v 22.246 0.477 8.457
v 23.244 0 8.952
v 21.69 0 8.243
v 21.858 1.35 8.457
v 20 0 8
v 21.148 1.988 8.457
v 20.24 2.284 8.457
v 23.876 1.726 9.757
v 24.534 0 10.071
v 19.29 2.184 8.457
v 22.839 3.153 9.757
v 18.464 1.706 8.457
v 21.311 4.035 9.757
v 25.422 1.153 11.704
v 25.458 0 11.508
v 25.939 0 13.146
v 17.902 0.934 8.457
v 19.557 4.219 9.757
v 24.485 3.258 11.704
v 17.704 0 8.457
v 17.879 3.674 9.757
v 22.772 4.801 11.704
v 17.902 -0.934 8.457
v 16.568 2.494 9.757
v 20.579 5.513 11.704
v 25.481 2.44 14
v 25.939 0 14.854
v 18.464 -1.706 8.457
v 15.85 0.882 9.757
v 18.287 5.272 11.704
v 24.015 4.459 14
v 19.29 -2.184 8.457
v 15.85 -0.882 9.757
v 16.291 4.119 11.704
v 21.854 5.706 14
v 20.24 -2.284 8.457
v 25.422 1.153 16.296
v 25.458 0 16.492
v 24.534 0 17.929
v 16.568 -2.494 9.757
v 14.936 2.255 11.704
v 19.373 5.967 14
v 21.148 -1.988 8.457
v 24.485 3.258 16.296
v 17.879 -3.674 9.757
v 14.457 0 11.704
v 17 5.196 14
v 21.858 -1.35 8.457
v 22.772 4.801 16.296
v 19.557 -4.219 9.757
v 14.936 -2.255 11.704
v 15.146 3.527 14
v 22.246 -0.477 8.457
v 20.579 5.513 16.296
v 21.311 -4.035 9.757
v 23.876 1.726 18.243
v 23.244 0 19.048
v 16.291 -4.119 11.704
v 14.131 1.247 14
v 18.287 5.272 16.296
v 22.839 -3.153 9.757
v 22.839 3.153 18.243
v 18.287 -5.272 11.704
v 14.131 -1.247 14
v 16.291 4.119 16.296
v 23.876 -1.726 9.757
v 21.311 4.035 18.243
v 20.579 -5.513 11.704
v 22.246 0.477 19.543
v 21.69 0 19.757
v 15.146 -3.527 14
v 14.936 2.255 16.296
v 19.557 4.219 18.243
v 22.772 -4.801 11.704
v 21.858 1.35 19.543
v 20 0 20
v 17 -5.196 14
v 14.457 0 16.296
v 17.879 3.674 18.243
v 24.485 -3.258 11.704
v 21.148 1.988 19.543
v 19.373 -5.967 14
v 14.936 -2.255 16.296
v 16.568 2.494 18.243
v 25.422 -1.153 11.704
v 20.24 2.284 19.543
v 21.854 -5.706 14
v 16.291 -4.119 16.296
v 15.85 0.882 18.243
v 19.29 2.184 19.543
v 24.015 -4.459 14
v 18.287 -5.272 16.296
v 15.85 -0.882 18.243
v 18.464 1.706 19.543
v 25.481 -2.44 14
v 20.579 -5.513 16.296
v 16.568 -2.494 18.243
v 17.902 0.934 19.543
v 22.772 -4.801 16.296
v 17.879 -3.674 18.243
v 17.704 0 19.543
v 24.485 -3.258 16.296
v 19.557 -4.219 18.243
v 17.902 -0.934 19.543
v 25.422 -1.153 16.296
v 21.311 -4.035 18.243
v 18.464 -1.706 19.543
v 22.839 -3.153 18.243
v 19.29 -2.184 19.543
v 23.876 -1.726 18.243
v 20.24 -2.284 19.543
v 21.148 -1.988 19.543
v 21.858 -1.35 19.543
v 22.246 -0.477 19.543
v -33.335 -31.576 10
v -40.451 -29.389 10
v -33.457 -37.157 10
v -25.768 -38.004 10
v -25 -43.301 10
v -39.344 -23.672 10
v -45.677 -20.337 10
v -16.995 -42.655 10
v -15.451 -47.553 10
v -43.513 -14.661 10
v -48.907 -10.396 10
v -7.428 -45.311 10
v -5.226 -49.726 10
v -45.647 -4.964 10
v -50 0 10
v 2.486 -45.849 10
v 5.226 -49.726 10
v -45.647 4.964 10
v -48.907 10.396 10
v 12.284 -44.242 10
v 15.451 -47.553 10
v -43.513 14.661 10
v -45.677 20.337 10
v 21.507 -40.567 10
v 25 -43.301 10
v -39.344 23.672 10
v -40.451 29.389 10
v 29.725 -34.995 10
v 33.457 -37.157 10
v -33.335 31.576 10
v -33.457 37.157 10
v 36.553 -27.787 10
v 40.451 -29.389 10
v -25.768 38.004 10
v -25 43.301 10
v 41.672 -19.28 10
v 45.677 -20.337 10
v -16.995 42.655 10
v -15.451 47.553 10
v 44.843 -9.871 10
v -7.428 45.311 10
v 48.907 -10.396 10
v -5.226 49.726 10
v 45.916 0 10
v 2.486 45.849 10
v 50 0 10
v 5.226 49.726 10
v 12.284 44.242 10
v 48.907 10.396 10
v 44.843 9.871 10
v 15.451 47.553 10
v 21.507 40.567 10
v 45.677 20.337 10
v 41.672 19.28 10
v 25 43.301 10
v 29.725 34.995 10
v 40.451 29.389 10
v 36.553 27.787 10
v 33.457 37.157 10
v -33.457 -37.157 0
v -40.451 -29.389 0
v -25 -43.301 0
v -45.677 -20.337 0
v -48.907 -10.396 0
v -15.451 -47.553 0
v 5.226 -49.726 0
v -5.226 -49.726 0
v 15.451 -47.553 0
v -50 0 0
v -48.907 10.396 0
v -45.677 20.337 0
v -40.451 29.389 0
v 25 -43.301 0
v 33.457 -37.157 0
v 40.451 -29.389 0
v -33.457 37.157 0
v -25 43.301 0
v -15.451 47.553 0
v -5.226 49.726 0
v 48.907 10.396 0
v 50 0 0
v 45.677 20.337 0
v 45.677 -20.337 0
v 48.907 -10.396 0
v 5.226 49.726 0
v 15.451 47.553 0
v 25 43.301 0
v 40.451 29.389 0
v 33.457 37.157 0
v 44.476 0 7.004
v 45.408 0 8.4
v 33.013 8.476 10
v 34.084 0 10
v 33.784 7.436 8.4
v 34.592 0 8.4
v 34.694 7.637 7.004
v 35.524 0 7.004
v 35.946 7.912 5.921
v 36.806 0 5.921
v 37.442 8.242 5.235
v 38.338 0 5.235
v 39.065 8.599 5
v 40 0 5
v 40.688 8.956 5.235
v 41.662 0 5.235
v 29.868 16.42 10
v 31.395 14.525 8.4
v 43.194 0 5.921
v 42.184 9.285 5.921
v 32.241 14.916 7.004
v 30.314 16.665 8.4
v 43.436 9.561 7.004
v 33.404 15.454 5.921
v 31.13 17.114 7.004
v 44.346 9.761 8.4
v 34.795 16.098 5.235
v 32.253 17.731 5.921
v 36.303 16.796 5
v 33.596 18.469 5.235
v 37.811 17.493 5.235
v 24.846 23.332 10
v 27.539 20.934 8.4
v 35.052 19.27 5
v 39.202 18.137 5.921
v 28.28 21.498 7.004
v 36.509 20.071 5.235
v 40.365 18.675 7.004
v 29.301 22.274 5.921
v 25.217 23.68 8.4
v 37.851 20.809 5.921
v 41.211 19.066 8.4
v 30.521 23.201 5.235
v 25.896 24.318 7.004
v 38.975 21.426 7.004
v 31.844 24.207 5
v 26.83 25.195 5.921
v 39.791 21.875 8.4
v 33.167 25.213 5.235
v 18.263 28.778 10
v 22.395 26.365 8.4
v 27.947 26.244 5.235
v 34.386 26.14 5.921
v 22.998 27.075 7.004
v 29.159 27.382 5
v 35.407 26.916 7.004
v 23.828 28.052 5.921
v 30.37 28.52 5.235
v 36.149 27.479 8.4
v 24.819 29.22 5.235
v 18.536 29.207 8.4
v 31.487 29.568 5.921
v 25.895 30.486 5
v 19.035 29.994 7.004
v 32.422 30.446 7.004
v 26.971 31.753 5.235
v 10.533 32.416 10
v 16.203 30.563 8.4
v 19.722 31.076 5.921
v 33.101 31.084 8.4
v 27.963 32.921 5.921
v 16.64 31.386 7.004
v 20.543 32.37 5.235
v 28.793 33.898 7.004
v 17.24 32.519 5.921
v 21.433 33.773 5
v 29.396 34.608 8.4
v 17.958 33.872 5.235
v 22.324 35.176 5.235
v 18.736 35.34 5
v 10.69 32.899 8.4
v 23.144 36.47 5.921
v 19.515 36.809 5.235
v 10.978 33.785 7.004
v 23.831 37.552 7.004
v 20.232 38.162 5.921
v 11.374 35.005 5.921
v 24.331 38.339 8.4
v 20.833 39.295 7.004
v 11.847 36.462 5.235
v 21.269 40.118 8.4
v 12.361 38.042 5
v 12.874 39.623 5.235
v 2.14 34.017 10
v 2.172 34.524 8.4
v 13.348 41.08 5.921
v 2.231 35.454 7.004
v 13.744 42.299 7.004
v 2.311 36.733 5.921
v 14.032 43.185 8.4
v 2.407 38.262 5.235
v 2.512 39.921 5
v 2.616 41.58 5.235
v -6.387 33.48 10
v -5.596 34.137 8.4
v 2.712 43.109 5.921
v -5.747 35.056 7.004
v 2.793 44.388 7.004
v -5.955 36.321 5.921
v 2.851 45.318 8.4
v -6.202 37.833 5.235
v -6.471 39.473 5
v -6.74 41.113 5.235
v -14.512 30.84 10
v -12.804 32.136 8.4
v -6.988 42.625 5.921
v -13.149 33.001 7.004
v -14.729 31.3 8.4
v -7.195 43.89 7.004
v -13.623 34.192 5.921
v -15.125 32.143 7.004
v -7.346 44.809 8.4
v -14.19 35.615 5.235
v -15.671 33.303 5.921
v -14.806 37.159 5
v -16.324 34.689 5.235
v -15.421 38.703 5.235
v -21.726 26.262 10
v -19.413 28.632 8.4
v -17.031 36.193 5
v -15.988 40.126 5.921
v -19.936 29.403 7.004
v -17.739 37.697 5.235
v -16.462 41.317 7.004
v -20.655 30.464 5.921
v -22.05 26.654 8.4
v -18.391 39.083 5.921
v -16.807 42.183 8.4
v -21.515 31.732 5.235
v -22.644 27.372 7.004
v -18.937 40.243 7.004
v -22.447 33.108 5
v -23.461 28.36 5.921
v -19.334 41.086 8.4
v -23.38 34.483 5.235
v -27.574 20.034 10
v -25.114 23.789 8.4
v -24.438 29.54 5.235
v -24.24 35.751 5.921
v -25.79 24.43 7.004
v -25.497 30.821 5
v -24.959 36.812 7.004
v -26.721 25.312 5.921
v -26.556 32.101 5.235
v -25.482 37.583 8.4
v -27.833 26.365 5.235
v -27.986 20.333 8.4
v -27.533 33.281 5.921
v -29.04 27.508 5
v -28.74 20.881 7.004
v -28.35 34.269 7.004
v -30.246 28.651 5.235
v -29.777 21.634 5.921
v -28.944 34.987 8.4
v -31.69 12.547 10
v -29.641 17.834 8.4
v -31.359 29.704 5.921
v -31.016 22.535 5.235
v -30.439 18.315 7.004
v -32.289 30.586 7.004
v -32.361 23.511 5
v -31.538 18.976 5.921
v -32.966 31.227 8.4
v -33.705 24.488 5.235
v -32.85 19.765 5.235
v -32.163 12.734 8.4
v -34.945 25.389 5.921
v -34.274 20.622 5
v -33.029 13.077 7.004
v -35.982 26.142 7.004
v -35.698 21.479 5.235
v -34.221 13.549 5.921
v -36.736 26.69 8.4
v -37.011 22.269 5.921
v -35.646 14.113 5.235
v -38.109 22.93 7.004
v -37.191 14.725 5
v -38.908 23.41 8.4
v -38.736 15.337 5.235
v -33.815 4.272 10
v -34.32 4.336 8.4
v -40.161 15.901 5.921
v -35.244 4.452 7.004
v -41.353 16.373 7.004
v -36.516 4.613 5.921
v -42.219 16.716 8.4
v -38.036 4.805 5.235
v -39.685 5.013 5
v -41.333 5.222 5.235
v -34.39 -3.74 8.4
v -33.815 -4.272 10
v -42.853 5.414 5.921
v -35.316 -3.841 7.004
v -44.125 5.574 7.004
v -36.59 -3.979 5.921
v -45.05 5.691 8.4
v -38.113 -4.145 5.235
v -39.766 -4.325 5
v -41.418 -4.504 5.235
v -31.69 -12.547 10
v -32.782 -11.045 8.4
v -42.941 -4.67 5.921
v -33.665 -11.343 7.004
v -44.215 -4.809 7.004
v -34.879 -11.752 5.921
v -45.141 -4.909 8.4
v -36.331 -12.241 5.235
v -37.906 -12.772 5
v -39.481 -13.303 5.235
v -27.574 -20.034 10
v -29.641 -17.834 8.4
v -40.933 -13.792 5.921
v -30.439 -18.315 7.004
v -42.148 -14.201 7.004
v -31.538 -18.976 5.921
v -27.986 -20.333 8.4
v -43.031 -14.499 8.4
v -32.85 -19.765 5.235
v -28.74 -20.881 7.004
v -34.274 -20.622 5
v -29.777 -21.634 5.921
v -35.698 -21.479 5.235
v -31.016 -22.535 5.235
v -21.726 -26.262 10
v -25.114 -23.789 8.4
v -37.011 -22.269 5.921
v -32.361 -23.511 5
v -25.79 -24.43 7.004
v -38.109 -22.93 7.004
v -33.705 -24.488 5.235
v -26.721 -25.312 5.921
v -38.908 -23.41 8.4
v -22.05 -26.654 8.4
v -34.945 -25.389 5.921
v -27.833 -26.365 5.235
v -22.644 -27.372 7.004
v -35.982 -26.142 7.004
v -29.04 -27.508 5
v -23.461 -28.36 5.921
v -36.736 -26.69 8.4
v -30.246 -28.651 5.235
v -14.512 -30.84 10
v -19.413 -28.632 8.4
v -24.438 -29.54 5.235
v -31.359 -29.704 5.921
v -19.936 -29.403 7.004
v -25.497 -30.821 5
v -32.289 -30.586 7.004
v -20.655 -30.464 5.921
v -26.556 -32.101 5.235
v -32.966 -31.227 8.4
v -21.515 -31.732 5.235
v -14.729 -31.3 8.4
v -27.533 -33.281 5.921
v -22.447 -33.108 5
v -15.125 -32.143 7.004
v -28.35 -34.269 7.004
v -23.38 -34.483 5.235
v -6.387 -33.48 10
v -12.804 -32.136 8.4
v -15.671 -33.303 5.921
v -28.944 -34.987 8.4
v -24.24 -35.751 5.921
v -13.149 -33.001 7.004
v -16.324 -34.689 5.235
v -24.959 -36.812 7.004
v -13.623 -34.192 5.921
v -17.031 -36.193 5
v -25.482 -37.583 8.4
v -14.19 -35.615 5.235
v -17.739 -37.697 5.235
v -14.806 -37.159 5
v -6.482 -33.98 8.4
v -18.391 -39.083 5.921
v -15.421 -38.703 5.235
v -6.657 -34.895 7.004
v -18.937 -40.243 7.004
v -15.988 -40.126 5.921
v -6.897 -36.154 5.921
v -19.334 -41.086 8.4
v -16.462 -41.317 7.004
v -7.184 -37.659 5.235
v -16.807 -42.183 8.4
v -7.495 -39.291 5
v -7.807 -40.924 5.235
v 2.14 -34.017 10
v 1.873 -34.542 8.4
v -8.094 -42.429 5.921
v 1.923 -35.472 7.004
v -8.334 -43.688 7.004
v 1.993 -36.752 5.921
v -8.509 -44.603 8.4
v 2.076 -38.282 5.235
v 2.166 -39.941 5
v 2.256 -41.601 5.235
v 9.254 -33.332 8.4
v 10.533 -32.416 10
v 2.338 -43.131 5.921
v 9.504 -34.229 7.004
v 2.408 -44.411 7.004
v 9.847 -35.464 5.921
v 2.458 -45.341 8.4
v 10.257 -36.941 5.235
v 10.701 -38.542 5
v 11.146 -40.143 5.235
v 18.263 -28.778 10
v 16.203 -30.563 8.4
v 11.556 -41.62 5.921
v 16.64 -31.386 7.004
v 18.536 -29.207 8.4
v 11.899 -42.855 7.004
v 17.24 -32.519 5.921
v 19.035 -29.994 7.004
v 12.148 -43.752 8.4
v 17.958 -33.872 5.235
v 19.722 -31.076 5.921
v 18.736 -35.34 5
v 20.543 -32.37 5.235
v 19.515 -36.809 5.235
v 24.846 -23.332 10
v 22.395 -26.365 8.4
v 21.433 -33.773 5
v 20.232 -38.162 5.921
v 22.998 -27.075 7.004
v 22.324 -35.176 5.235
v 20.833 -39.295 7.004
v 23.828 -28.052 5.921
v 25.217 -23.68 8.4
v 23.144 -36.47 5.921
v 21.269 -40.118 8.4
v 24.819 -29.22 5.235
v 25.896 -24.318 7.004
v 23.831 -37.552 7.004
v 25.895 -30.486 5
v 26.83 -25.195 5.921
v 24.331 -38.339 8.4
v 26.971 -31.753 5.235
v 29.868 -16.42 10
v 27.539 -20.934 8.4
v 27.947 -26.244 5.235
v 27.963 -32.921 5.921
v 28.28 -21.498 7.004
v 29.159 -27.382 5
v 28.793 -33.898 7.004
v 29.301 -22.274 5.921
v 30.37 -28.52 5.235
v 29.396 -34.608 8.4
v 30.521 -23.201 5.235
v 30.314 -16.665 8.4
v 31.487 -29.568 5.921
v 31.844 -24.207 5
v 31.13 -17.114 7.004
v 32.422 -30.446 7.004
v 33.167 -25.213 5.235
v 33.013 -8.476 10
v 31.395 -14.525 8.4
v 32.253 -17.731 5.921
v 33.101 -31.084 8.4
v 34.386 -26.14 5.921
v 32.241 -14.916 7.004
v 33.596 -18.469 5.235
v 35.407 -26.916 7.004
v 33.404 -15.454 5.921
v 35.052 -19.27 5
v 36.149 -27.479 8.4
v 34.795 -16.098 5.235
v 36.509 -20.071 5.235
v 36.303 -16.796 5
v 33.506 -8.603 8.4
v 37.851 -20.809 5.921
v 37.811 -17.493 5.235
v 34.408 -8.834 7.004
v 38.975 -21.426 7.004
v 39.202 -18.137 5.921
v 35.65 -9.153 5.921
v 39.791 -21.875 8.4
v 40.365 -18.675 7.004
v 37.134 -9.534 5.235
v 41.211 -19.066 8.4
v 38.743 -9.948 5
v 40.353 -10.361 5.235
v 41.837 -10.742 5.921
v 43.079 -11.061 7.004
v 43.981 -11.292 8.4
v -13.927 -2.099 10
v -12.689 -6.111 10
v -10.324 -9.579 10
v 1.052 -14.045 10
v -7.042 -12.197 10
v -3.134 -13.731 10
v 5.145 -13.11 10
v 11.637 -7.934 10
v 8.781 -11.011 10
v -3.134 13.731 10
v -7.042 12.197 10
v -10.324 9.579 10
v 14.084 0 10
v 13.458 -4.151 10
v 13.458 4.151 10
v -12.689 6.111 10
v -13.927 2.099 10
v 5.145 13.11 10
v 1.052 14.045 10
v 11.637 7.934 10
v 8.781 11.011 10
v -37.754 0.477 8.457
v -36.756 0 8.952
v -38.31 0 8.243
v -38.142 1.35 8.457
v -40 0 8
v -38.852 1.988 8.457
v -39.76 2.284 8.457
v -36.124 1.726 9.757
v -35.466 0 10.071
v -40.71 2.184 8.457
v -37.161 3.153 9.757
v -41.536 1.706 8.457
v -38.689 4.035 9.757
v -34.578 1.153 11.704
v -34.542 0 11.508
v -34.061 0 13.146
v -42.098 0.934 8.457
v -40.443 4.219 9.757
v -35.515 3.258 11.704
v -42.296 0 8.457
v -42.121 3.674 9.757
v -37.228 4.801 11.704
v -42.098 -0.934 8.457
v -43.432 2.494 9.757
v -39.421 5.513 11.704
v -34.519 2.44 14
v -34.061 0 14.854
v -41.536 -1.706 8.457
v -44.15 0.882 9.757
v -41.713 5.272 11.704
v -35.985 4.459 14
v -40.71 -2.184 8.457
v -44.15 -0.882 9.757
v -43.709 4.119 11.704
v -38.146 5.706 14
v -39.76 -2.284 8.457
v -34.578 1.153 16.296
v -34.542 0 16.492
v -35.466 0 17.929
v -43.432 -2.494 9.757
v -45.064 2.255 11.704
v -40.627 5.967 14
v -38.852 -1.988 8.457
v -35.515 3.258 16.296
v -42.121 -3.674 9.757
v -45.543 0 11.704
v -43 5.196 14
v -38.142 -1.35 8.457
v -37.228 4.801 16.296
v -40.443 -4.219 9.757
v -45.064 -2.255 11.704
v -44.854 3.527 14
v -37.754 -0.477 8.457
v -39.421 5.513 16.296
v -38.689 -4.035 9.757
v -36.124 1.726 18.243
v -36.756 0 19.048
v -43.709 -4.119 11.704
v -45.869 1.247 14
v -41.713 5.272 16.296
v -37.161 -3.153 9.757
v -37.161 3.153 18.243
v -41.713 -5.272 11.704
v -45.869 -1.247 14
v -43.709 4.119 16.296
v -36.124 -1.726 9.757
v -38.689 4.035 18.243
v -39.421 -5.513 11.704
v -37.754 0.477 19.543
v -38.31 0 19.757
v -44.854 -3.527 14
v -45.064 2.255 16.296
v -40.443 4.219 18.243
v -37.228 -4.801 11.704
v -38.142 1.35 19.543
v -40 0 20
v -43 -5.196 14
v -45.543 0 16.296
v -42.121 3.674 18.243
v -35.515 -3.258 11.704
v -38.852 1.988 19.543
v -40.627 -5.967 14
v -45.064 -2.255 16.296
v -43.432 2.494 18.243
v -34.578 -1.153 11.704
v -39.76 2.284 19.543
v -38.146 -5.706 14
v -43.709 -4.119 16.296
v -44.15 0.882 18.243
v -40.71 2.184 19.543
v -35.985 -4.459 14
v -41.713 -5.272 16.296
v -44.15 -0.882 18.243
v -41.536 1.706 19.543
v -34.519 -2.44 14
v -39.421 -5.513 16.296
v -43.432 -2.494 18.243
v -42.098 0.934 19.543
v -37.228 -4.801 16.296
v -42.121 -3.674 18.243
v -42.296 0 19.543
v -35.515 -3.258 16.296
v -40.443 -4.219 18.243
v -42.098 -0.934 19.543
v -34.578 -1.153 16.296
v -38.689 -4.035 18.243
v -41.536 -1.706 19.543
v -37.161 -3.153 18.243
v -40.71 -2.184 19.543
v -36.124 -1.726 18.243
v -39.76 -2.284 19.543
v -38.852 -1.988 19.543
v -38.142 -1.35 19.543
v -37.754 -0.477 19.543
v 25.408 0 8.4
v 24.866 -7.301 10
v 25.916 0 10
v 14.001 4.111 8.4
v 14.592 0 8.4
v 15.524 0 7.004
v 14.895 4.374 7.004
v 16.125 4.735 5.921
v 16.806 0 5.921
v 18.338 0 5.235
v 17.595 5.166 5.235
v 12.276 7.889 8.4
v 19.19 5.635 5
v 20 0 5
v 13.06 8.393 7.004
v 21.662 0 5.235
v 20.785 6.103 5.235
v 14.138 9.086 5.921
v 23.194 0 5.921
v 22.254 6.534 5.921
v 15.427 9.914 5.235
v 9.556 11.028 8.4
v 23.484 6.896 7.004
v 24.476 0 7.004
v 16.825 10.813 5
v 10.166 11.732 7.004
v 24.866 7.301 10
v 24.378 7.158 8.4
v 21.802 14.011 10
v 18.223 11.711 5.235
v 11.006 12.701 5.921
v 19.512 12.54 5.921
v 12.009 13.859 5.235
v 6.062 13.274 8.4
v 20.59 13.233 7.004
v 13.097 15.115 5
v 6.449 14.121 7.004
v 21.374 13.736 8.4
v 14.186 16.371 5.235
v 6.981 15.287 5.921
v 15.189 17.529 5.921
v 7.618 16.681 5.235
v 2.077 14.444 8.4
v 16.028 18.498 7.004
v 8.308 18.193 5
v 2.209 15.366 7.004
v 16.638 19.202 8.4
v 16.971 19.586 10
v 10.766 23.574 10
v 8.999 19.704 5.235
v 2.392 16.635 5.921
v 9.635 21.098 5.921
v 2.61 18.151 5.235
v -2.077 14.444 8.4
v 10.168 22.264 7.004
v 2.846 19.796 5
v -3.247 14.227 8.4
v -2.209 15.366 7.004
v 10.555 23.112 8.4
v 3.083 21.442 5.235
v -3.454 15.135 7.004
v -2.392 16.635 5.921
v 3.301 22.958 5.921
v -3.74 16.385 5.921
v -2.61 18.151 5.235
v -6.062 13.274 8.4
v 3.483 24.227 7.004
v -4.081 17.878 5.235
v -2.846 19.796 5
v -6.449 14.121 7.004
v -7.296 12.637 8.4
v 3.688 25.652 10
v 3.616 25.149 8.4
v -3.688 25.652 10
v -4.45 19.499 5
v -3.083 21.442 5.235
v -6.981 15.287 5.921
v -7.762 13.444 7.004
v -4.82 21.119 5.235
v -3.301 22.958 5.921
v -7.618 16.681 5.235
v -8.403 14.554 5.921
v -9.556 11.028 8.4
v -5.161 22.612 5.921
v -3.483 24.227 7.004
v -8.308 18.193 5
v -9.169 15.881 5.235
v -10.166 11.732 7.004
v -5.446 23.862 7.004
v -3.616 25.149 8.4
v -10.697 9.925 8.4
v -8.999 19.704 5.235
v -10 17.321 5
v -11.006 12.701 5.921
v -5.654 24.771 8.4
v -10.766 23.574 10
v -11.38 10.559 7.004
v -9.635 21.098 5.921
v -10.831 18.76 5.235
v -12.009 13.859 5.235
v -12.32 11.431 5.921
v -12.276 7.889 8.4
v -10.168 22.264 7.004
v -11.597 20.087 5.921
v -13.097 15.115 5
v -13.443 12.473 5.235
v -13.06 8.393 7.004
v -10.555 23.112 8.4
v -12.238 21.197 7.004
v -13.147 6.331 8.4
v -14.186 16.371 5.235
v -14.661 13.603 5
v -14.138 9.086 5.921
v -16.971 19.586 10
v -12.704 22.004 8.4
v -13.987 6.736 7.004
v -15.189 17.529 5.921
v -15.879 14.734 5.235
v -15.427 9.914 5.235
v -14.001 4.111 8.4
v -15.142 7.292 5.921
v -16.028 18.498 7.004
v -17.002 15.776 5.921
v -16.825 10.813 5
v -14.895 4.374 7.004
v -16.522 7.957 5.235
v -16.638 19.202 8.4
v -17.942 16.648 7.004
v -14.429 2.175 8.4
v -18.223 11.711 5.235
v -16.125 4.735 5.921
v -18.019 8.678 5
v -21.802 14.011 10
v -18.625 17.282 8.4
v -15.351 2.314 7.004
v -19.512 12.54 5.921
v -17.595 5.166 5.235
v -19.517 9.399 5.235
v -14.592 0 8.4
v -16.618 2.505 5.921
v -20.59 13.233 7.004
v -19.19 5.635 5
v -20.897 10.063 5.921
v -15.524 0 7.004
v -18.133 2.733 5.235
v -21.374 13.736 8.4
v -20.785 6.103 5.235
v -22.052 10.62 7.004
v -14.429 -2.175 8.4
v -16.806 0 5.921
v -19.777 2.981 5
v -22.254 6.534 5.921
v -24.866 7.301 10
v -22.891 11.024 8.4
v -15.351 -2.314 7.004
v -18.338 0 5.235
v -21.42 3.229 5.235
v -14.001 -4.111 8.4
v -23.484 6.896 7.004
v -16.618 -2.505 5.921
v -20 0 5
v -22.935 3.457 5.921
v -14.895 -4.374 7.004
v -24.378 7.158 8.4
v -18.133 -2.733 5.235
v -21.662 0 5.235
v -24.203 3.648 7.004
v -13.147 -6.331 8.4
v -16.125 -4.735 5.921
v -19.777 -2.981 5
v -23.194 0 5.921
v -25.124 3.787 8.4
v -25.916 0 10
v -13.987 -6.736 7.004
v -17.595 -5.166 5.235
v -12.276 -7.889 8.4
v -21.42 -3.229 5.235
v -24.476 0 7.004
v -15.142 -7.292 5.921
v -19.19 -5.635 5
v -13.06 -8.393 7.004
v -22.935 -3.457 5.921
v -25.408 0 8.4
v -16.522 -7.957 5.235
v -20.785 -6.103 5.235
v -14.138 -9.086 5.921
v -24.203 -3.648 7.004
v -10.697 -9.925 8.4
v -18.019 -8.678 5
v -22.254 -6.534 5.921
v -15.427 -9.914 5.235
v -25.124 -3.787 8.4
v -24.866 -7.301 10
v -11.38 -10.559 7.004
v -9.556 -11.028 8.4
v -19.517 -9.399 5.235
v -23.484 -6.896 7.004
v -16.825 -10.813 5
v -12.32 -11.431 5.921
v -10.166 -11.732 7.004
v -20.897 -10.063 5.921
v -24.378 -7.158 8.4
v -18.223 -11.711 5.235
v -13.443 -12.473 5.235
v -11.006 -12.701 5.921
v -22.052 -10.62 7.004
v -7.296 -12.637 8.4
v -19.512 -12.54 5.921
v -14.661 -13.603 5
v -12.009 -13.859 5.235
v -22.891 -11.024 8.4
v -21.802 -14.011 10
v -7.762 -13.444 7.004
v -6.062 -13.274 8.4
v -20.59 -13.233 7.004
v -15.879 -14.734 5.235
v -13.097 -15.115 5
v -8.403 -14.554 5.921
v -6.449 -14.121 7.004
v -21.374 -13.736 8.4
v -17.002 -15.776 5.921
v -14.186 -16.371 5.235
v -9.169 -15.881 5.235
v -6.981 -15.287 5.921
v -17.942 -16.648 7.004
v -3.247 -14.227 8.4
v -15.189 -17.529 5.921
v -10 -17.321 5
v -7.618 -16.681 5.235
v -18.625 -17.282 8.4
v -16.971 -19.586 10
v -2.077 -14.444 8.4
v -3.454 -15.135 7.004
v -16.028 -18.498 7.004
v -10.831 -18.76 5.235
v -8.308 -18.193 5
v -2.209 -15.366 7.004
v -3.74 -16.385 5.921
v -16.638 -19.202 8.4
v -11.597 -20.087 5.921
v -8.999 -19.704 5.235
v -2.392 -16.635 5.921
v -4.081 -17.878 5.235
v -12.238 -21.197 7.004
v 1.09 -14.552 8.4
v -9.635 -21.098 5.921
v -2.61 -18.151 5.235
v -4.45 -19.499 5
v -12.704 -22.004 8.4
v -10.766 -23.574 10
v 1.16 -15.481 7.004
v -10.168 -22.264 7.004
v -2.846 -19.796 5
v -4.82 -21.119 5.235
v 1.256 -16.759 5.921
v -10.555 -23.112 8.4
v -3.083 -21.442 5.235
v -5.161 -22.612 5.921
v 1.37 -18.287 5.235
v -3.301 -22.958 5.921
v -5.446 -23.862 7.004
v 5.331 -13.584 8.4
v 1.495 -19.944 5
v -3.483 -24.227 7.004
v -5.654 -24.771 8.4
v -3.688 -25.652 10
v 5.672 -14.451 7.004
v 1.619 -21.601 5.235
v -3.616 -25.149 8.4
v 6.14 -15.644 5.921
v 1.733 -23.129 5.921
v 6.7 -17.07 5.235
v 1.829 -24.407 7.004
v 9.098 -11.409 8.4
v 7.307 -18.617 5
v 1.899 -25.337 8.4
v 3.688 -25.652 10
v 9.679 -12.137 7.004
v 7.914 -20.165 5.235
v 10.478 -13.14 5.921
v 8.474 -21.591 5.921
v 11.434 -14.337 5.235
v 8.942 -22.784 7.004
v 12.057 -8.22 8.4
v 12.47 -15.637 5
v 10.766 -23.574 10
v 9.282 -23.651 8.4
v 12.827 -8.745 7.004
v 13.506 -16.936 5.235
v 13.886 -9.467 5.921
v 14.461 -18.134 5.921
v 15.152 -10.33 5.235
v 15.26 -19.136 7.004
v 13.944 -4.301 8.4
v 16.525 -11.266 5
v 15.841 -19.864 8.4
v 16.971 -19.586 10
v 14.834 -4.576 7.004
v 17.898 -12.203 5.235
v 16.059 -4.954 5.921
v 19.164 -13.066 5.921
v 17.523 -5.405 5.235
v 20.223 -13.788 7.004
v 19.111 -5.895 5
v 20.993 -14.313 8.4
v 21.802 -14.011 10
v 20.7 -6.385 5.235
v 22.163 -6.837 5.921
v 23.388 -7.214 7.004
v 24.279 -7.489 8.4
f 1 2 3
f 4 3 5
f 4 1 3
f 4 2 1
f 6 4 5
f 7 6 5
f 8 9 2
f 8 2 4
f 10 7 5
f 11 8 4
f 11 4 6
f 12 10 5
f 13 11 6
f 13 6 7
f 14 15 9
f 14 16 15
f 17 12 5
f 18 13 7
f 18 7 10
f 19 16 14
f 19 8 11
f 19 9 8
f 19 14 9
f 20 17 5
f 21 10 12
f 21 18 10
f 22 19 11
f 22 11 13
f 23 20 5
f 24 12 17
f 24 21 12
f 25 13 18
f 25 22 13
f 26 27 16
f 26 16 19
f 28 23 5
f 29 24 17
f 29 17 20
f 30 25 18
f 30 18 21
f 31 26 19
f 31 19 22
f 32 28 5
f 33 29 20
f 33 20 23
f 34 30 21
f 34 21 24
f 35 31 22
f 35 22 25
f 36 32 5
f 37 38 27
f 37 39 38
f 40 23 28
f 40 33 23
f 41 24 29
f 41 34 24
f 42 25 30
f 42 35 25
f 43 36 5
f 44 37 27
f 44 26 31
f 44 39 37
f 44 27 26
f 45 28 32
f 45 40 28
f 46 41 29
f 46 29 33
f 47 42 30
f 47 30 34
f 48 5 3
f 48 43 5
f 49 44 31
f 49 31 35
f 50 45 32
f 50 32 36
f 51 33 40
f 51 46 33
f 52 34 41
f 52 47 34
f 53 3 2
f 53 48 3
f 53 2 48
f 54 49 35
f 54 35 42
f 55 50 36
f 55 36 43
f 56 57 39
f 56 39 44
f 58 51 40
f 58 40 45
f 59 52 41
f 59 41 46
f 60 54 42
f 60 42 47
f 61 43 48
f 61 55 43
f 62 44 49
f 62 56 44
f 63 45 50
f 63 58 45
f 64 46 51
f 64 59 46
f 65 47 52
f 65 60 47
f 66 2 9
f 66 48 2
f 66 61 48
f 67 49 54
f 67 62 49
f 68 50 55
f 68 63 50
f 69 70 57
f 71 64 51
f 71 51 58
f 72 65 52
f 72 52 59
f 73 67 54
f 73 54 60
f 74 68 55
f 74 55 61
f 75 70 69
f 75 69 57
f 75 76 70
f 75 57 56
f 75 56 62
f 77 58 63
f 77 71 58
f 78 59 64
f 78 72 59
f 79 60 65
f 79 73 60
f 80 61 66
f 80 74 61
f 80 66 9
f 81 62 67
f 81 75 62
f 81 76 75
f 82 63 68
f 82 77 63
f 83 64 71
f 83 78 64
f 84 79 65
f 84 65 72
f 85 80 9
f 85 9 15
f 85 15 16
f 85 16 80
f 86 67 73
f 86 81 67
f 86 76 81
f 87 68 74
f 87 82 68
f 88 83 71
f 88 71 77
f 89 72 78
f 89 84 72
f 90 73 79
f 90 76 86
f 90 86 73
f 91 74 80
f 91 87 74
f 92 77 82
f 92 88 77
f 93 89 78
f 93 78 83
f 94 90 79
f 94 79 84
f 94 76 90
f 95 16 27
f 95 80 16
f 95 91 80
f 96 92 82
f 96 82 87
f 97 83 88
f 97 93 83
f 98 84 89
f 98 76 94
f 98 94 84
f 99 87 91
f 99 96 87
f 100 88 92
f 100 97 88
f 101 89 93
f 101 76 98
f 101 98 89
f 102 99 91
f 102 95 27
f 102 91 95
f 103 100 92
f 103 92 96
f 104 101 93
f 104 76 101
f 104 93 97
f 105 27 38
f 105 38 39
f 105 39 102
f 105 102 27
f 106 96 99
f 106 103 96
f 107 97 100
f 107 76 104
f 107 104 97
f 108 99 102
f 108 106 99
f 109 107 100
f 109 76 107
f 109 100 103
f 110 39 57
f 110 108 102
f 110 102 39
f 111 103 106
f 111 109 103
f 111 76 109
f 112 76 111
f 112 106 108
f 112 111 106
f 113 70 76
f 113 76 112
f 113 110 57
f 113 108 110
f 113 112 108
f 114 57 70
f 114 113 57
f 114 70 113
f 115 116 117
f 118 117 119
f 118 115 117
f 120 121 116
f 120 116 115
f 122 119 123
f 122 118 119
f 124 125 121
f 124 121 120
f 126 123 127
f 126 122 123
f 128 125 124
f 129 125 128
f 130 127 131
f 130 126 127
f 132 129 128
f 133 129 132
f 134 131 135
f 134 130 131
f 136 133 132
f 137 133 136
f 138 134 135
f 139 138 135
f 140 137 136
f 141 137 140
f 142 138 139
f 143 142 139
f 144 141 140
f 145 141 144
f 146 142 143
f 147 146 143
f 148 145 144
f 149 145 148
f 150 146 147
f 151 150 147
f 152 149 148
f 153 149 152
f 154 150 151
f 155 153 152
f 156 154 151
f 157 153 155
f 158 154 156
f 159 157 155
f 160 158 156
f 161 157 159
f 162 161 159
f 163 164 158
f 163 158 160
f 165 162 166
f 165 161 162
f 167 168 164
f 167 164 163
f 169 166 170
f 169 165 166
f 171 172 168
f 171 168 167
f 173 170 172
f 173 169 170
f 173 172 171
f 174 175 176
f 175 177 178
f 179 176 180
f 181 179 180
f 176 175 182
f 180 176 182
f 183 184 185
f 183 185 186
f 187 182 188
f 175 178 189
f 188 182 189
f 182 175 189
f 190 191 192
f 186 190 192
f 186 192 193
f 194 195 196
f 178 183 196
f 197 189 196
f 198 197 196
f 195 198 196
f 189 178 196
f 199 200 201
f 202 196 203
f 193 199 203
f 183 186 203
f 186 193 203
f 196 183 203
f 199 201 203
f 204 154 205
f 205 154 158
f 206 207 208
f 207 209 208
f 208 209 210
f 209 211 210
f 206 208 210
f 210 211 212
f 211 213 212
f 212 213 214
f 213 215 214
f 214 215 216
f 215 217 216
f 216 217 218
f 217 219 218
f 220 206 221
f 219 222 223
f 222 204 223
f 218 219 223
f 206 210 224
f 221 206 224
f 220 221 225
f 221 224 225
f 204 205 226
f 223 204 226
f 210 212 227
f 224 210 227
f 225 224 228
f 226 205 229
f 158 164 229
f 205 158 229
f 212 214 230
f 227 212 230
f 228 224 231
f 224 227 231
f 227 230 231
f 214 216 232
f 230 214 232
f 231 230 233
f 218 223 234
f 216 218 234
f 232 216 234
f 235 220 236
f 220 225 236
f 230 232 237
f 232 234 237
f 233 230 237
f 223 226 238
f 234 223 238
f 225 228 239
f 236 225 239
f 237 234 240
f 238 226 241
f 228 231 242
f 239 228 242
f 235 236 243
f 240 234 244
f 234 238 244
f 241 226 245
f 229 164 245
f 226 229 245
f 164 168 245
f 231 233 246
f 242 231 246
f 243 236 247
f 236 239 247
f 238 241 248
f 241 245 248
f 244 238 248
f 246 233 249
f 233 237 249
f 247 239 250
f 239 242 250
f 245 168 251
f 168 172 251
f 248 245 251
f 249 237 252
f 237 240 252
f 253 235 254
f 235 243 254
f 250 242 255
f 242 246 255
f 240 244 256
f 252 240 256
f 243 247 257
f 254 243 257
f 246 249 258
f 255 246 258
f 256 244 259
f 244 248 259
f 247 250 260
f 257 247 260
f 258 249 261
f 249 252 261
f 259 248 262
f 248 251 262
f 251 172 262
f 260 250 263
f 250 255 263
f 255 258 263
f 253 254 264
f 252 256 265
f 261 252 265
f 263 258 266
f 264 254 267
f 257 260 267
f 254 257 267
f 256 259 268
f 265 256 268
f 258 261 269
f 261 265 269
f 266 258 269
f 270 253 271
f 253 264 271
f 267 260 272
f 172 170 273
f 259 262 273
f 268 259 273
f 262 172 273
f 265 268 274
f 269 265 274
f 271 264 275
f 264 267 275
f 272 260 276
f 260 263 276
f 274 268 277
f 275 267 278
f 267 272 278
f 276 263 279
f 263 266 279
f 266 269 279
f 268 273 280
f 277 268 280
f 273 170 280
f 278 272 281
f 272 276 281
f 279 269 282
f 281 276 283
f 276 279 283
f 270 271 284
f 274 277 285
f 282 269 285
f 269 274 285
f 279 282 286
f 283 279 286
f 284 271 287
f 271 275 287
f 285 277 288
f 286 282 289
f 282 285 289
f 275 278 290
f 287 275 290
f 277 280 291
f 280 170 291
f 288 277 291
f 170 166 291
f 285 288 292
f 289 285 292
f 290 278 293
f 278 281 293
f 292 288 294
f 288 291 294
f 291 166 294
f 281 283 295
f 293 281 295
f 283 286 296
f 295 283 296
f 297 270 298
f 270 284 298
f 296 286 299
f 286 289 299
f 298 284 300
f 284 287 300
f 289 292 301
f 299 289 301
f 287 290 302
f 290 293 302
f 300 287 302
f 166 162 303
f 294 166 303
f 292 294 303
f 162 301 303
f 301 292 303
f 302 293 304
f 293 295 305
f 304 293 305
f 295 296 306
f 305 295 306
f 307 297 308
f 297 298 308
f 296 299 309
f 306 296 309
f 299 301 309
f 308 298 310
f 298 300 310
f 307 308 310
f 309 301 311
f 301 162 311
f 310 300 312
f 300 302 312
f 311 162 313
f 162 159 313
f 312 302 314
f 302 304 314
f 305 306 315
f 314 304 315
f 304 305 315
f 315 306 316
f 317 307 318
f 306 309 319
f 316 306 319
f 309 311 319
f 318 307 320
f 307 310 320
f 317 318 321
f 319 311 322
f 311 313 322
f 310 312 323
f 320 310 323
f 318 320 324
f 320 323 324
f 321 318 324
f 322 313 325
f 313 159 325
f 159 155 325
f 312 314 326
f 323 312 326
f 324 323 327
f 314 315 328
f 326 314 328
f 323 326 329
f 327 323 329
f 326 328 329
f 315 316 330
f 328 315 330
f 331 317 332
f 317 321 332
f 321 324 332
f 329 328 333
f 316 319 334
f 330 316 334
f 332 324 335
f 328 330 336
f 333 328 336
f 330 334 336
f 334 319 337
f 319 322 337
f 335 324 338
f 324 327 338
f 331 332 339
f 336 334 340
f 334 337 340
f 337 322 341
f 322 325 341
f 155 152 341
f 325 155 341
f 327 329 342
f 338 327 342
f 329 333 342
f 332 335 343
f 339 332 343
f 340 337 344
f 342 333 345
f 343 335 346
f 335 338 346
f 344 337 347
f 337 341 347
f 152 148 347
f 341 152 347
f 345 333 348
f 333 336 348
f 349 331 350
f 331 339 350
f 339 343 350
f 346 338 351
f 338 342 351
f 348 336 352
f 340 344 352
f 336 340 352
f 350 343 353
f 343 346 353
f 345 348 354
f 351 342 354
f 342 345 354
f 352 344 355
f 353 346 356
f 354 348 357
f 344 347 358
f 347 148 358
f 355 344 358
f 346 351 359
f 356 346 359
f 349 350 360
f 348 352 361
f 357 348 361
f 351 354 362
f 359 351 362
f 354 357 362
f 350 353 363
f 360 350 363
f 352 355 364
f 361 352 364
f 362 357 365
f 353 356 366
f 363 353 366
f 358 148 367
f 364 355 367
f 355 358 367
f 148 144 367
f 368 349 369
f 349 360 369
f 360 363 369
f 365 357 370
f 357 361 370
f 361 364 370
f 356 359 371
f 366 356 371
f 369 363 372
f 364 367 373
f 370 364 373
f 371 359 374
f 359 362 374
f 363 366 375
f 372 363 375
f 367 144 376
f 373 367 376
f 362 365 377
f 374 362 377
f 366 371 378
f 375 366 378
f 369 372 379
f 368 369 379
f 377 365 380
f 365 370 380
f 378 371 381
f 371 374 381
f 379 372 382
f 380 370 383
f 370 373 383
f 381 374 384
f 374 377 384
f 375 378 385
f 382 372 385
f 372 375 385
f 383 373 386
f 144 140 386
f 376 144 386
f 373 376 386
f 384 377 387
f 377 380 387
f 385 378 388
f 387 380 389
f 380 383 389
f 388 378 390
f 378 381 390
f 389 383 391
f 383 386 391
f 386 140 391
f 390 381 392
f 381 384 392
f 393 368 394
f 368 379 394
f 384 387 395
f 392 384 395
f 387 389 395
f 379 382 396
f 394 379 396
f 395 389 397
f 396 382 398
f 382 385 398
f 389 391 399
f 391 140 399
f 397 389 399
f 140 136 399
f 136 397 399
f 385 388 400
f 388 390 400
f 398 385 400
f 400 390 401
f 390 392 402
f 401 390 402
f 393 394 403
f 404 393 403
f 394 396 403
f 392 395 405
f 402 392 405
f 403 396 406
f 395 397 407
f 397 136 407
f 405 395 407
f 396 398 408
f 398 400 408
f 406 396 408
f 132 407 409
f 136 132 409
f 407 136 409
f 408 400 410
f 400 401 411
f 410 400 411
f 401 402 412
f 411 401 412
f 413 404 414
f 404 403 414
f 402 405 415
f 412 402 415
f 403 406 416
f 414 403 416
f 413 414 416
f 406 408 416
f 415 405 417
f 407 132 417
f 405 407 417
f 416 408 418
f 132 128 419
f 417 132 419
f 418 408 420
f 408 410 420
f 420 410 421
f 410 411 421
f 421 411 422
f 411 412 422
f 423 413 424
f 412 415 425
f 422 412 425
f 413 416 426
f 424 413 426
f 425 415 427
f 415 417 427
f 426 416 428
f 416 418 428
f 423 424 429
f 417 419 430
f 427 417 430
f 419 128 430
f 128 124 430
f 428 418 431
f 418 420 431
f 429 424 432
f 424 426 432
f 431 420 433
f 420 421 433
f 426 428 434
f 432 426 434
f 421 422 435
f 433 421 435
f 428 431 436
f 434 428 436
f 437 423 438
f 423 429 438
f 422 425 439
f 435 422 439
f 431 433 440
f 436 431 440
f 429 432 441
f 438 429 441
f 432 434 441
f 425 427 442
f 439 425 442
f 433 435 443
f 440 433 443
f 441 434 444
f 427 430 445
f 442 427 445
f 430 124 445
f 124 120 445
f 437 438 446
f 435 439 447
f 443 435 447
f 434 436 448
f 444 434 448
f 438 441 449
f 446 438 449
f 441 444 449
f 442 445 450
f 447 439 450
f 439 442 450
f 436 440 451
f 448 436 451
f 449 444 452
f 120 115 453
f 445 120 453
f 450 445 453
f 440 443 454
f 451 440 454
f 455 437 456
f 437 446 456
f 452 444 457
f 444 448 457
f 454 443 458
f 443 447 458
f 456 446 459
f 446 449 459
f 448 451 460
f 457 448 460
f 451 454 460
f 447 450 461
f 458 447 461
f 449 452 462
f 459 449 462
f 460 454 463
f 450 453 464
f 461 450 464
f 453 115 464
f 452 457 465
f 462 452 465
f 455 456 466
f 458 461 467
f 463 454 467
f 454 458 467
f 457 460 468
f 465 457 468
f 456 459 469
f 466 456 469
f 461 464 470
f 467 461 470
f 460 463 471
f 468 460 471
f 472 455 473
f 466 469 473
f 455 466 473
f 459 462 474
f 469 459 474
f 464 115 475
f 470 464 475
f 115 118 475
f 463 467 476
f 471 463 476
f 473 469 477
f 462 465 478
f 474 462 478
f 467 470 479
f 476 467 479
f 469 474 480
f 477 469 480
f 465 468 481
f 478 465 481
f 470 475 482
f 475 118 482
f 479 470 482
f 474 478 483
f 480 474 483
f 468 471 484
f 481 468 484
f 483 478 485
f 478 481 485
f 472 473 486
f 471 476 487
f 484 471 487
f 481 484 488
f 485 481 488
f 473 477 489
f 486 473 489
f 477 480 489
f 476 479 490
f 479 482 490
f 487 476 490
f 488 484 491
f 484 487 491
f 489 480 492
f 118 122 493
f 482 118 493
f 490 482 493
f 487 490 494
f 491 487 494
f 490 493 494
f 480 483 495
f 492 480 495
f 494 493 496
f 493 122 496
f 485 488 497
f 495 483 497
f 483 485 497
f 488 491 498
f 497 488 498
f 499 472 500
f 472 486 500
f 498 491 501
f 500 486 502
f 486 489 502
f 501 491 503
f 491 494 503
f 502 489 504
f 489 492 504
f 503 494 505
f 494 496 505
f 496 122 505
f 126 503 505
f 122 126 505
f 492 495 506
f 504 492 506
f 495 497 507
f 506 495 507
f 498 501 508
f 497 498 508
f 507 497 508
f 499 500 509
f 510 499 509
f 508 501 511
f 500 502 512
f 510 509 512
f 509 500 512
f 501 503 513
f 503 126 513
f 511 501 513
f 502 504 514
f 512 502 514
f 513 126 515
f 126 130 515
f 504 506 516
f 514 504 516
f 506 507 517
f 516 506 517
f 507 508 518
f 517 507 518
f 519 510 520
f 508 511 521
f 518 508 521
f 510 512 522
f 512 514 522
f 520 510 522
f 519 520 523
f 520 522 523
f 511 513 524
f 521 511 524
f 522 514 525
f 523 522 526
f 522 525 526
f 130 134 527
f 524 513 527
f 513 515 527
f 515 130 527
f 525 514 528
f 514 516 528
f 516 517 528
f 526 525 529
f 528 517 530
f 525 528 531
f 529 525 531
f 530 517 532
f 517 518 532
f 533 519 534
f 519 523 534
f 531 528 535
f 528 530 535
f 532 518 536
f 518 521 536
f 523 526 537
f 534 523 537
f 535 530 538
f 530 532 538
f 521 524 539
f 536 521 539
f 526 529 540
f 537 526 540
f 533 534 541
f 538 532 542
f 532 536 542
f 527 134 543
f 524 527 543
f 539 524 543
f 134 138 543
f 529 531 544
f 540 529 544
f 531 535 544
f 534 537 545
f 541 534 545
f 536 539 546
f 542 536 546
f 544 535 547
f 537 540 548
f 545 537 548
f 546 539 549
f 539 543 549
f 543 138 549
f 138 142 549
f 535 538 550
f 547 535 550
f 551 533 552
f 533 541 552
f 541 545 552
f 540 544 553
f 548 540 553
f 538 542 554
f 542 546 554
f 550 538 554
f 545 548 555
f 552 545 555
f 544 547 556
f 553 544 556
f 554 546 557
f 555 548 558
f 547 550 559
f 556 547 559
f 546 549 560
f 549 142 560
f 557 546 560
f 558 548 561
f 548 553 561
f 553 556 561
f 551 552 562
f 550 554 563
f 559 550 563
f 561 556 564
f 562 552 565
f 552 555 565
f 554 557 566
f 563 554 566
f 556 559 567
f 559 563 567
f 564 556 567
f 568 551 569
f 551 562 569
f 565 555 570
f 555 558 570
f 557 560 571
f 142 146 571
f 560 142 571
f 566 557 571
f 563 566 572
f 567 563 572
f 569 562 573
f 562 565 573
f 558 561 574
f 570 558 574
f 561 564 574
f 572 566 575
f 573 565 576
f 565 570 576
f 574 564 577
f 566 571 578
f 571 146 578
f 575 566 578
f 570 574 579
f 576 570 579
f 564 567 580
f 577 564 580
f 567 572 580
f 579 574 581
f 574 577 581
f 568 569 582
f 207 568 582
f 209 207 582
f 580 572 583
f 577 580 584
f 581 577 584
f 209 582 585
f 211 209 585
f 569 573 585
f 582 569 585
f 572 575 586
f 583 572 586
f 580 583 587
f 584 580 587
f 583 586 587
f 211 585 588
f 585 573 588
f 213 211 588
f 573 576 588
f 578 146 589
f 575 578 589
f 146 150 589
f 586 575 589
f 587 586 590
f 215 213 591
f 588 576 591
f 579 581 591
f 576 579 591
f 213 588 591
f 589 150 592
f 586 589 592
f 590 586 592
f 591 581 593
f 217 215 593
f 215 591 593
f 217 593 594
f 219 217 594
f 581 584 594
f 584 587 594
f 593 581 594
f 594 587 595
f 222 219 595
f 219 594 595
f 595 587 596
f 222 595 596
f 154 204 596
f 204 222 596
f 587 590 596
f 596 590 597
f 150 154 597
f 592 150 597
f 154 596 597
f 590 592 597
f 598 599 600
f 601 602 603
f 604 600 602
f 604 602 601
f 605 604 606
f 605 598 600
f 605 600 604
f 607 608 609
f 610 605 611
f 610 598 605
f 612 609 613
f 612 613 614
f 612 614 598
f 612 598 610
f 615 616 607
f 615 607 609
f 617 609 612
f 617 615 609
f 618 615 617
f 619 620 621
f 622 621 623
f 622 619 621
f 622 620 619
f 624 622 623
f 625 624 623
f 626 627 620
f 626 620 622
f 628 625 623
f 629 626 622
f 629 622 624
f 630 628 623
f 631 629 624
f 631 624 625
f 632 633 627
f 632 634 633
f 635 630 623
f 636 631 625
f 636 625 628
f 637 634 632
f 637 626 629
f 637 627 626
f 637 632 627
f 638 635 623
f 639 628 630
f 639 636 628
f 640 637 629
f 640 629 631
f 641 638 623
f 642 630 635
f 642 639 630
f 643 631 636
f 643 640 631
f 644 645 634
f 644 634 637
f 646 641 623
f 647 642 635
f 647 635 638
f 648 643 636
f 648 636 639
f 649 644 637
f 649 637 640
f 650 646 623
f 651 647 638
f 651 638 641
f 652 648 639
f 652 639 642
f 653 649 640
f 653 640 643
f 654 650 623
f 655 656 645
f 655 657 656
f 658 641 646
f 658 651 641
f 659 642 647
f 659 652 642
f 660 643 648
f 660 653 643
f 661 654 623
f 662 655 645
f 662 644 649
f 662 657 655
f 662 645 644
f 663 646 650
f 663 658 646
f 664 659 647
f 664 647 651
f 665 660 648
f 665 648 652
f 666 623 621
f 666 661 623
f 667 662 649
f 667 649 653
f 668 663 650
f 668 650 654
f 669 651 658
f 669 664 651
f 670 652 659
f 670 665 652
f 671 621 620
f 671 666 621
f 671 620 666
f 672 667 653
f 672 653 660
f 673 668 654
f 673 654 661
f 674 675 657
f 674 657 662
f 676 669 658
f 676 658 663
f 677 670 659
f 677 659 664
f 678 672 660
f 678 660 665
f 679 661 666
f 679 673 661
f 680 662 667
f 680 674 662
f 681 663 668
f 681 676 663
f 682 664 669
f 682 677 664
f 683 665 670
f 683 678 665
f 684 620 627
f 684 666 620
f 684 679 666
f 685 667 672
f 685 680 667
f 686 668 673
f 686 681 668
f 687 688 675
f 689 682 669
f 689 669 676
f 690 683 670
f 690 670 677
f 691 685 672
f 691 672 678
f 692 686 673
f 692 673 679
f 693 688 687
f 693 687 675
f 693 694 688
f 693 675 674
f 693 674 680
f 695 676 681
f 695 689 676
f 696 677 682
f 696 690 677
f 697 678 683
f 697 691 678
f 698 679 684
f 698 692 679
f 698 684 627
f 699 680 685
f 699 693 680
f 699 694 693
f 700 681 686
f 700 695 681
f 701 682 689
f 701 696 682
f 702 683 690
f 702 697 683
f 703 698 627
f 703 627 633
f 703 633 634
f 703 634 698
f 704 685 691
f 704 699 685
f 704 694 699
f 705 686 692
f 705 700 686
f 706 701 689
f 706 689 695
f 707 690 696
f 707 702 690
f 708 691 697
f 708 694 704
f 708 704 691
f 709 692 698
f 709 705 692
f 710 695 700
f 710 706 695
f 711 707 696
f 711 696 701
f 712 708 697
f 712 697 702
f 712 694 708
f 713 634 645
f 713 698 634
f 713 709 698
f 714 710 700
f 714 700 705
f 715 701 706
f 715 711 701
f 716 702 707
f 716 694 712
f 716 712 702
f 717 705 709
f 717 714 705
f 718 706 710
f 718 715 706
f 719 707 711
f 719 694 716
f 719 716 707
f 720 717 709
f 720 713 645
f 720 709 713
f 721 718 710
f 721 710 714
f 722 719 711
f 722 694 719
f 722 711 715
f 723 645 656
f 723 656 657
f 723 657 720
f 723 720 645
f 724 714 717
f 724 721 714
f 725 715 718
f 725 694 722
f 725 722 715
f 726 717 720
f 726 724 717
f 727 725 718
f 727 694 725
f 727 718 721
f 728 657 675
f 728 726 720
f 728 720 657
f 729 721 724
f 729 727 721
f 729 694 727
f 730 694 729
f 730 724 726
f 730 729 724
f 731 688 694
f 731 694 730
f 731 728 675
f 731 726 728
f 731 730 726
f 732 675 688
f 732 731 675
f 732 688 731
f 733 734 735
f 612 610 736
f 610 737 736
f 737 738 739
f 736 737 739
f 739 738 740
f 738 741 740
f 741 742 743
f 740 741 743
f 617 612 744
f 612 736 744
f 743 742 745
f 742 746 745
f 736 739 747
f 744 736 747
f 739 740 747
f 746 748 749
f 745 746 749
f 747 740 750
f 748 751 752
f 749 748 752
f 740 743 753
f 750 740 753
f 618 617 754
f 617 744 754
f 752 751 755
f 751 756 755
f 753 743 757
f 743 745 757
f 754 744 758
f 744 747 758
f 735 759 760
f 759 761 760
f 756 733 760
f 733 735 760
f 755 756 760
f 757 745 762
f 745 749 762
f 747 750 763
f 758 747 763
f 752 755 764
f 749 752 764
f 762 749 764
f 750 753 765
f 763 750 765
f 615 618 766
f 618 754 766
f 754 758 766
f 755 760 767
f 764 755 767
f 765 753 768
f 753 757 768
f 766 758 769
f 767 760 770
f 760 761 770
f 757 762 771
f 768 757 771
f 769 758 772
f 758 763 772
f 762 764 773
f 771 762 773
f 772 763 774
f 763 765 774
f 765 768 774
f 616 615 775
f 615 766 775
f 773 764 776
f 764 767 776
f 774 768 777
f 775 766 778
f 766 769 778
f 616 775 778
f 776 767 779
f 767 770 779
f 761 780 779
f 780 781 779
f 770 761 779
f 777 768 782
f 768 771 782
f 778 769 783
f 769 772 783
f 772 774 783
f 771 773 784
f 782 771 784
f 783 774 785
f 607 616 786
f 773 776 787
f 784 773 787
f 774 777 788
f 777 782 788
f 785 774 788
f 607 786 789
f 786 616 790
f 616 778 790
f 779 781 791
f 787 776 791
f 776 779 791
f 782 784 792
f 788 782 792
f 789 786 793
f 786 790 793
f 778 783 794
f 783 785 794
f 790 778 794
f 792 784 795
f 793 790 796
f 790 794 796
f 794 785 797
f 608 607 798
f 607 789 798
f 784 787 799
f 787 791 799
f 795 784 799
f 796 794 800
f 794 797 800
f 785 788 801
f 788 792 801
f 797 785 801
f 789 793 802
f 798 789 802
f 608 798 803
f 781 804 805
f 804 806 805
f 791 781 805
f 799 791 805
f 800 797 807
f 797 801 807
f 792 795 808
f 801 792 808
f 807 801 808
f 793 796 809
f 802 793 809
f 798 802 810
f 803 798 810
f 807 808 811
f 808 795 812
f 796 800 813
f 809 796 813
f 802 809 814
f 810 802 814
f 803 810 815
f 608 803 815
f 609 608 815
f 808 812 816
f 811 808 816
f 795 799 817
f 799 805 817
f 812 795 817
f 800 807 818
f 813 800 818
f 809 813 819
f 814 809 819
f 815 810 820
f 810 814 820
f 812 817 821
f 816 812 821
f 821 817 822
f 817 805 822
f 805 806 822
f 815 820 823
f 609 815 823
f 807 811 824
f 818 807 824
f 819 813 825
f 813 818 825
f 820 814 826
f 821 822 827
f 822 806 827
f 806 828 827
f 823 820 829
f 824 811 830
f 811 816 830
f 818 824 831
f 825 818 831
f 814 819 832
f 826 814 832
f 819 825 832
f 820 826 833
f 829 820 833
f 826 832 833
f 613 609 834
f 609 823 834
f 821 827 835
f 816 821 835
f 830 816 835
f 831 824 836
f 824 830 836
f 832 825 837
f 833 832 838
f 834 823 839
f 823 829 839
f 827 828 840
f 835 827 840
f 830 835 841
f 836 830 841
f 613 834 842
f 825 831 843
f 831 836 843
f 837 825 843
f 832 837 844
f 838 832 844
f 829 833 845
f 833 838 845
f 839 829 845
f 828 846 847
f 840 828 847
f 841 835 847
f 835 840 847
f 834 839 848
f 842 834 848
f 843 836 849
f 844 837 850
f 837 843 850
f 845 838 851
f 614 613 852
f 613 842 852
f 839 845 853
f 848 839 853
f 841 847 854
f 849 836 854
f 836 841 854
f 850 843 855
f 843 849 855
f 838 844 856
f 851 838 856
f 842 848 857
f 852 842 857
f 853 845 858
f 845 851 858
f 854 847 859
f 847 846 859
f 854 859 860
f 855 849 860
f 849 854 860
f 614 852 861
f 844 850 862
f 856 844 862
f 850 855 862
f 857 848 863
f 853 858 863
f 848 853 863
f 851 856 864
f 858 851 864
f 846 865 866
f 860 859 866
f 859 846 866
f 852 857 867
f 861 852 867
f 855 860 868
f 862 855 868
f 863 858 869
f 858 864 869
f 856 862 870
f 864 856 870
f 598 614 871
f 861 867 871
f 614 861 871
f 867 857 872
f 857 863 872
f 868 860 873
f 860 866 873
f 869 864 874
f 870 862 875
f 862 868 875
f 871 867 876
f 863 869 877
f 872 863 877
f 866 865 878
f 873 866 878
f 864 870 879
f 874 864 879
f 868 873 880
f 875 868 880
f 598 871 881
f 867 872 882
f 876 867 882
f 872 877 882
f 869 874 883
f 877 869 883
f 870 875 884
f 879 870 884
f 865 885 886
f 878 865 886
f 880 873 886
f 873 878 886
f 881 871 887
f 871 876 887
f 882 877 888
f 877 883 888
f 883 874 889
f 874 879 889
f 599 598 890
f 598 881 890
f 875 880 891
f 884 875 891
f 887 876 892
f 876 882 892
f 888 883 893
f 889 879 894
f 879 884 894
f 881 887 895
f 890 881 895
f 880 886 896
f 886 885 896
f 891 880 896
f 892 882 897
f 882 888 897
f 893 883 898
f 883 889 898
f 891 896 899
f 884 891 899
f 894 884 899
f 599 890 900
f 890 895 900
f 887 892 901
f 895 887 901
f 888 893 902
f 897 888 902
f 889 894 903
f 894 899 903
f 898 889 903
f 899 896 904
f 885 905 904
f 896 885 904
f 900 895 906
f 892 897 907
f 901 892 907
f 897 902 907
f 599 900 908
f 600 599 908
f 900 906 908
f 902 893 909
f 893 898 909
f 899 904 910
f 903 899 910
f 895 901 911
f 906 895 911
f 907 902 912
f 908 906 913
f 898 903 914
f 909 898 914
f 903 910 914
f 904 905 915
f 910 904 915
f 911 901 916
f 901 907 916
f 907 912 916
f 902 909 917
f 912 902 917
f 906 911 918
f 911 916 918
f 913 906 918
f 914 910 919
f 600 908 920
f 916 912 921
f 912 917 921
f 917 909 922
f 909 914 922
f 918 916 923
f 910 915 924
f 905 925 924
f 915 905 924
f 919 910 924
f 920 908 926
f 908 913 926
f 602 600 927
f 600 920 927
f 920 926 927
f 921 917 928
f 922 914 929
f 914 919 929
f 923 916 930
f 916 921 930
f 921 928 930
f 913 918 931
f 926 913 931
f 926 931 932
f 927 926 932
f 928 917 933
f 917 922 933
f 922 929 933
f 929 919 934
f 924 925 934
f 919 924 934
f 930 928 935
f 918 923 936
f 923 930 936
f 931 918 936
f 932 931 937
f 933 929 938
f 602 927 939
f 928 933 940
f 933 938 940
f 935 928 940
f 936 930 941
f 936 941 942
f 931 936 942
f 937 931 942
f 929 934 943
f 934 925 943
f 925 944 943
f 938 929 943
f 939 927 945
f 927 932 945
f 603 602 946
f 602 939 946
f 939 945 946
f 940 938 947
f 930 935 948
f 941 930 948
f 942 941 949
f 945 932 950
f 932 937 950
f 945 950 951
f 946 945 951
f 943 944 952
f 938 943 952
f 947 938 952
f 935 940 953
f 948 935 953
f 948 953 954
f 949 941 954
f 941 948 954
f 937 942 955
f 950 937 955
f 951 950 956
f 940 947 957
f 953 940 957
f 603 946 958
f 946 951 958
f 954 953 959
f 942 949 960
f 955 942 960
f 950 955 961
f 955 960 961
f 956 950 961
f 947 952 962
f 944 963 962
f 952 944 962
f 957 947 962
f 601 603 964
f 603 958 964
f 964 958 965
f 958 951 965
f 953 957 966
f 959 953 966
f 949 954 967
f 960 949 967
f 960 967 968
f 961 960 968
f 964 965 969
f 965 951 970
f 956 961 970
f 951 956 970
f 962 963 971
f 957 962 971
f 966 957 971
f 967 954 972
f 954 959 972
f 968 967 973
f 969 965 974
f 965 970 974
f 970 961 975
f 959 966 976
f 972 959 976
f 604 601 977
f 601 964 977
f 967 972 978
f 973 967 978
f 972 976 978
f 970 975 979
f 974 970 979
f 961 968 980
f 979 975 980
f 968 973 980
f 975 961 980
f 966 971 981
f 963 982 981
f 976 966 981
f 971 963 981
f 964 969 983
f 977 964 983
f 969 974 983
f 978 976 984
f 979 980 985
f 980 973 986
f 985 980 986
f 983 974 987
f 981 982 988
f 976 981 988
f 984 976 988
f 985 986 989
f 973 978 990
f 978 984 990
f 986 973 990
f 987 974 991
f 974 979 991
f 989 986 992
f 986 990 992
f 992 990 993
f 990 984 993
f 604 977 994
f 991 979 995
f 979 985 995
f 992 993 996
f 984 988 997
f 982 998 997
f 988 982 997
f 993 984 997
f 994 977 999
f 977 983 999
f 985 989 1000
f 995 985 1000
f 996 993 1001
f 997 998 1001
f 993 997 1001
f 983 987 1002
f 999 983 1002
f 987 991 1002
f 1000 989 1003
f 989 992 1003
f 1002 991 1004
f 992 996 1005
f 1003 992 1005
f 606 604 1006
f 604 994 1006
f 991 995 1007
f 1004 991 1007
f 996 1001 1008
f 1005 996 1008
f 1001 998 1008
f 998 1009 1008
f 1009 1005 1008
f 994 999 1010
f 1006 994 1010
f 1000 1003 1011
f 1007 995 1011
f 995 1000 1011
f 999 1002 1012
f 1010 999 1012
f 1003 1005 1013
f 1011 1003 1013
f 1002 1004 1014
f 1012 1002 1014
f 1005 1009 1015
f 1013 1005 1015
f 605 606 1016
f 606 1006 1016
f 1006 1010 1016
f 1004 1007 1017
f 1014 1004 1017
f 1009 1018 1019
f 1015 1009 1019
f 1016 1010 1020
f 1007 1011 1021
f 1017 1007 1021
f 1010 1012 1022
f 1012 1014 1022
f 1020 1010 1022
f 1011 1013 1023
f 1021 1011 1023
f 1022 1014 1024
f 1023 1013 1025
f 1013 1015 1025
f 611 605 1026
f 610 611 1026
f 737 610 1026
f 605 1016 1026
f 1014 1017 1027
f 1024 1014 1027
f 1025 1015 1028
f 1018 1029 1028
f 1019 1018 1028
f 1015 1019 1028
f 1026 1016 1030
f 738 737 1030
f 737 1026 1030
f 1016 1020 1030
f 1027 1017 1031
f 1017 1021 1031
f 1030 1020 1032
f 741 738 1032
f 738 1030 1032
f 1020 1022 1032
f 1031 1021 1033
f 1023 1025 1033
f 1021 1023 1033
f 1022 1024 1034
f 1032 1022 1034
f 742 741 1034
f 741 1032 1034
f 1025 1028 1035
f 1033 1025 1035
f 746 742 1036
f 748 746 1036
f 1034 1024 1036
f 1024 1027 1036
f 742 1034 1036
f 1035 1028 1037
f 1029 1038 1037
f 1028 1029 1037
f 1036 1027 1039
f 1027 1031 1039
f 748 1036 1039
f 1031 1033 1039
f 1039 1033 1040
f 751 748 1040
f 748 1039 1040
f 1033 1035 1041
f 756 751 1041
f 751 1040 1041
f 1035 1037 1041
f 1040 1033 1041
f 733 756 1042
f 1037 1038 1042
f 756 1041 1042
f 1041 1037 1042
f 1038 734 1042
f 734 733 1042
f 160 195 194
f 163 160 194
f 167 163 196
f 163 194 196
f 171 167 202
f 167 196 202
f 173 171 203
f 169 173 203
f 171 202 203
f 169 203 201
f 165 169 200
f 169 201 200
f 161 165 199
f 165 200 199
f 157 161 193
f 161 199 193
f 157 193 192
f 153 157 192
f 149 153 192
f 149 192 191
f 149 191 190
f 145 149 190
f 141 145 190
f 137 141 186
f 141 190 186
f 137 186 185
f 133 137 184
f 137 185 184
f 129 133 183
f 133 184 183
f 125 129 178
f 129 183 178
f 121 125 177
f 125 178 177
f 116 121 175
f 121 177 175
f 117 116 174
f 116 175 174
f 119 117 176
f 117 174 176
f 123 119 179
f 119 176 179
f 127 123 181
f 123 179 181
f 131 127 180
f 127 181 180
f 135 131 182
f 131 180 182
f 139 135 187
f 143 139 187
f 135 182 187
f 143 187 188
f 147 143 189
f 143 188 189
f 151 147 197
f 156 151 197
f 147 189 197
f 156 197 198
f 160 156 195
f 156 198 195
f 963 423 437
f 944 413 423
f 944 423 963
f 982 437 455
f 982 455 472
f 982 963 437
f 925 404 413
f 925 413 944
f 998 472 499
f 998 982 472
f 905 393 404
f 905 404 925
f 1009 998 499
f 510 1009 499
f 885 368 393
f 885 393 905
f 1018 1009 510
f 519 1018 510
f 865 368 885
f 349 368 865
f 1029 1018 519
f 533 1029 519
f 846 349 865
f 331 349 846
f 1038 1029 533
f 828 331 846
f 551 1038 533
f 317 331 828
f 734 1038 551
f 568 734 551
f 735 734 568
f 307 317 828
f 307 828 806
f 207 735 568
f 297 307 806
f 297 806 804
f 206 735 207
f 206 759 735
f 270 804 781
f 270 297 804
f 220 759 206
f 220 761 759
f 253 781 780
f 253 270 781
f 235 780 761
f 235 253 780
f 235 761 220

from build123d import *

# Parameters (mm, degrees)
TORUS001_R     = 6
TORUS_R        = 6
CYLINDER_R     = 50
CYLINDER_DEPTH = 10


with BuildPart() as torus001:
    # Torus001 → Torus001 (revolve)
    with BuildSketch(Plane(origin=(0, 0, 11), x_dir=(1, 0, 0), z_dir=(0, -1, 0))):
        with Locations((20, 0)):
            Circle(TORUS001_R)
    revolve(axis=Axis((0, 0, 11), (0, 0, 1)))


with BuildPart() as torus:
    # Torus → Torus (revolve)
    with BuildSketch(Plane(origin=(0, 0, 11), x_dir=(1, 0, 0), z_dir=(0, -1, 0))):
        with Locations((40, 0)):
            Circle(TORUS_R)
    revolve(axis=Axis((0, 0, 11), (0, 0, 1)))


with BuildPart() as cut001:
    # Cylinder → Cylinder (new body)
    with BuildSketch(Plane.XY):
        Circle(CYLINDER_R)
    extrude(amount=CYLINDER_DEPTH)

    # Cut: cut Torus
    add(torus.part, mode=Mode.SUBTRACT)

    # Cut001: cut Torus001
    add(torus001.part, mode=Mode.SUBTRACT)


with BuildPart() as sphere:
    # Sphere → Sphere (revolve)
    with BuildSketch(Plane(origin=(20, 0, 14), x_dir=(1, 0, 0), z_dir=(0, -1, 0))):
        with BuildLine():
            ThreePointArc((0, -6), (6, 0), (0, 6))
            Line((0, 6), (0, -6))
        make_face()
    revolve(axis=Axis((20, 0, 14), (0, 0, 1)))


with BuildPart() as sphere001:
    # Sphere001 → Sphere001 (revolve)
    with BuildSketch(Plane(origin=(-40, 0, 14), x_dir=(1, 0, 0), z_dir=(0, -1, 0))):
        with BuildLine():
            ThreePointArc((0, -6), (6, 0), (0, 6))
            Line((0, 6), (0, -6))
        make_face()
    revolve(axis=Axis((-40, 0, 14), (0, 0, 1)))


solid = Compound([cut001.part, sphere.part, sphere001.part])
